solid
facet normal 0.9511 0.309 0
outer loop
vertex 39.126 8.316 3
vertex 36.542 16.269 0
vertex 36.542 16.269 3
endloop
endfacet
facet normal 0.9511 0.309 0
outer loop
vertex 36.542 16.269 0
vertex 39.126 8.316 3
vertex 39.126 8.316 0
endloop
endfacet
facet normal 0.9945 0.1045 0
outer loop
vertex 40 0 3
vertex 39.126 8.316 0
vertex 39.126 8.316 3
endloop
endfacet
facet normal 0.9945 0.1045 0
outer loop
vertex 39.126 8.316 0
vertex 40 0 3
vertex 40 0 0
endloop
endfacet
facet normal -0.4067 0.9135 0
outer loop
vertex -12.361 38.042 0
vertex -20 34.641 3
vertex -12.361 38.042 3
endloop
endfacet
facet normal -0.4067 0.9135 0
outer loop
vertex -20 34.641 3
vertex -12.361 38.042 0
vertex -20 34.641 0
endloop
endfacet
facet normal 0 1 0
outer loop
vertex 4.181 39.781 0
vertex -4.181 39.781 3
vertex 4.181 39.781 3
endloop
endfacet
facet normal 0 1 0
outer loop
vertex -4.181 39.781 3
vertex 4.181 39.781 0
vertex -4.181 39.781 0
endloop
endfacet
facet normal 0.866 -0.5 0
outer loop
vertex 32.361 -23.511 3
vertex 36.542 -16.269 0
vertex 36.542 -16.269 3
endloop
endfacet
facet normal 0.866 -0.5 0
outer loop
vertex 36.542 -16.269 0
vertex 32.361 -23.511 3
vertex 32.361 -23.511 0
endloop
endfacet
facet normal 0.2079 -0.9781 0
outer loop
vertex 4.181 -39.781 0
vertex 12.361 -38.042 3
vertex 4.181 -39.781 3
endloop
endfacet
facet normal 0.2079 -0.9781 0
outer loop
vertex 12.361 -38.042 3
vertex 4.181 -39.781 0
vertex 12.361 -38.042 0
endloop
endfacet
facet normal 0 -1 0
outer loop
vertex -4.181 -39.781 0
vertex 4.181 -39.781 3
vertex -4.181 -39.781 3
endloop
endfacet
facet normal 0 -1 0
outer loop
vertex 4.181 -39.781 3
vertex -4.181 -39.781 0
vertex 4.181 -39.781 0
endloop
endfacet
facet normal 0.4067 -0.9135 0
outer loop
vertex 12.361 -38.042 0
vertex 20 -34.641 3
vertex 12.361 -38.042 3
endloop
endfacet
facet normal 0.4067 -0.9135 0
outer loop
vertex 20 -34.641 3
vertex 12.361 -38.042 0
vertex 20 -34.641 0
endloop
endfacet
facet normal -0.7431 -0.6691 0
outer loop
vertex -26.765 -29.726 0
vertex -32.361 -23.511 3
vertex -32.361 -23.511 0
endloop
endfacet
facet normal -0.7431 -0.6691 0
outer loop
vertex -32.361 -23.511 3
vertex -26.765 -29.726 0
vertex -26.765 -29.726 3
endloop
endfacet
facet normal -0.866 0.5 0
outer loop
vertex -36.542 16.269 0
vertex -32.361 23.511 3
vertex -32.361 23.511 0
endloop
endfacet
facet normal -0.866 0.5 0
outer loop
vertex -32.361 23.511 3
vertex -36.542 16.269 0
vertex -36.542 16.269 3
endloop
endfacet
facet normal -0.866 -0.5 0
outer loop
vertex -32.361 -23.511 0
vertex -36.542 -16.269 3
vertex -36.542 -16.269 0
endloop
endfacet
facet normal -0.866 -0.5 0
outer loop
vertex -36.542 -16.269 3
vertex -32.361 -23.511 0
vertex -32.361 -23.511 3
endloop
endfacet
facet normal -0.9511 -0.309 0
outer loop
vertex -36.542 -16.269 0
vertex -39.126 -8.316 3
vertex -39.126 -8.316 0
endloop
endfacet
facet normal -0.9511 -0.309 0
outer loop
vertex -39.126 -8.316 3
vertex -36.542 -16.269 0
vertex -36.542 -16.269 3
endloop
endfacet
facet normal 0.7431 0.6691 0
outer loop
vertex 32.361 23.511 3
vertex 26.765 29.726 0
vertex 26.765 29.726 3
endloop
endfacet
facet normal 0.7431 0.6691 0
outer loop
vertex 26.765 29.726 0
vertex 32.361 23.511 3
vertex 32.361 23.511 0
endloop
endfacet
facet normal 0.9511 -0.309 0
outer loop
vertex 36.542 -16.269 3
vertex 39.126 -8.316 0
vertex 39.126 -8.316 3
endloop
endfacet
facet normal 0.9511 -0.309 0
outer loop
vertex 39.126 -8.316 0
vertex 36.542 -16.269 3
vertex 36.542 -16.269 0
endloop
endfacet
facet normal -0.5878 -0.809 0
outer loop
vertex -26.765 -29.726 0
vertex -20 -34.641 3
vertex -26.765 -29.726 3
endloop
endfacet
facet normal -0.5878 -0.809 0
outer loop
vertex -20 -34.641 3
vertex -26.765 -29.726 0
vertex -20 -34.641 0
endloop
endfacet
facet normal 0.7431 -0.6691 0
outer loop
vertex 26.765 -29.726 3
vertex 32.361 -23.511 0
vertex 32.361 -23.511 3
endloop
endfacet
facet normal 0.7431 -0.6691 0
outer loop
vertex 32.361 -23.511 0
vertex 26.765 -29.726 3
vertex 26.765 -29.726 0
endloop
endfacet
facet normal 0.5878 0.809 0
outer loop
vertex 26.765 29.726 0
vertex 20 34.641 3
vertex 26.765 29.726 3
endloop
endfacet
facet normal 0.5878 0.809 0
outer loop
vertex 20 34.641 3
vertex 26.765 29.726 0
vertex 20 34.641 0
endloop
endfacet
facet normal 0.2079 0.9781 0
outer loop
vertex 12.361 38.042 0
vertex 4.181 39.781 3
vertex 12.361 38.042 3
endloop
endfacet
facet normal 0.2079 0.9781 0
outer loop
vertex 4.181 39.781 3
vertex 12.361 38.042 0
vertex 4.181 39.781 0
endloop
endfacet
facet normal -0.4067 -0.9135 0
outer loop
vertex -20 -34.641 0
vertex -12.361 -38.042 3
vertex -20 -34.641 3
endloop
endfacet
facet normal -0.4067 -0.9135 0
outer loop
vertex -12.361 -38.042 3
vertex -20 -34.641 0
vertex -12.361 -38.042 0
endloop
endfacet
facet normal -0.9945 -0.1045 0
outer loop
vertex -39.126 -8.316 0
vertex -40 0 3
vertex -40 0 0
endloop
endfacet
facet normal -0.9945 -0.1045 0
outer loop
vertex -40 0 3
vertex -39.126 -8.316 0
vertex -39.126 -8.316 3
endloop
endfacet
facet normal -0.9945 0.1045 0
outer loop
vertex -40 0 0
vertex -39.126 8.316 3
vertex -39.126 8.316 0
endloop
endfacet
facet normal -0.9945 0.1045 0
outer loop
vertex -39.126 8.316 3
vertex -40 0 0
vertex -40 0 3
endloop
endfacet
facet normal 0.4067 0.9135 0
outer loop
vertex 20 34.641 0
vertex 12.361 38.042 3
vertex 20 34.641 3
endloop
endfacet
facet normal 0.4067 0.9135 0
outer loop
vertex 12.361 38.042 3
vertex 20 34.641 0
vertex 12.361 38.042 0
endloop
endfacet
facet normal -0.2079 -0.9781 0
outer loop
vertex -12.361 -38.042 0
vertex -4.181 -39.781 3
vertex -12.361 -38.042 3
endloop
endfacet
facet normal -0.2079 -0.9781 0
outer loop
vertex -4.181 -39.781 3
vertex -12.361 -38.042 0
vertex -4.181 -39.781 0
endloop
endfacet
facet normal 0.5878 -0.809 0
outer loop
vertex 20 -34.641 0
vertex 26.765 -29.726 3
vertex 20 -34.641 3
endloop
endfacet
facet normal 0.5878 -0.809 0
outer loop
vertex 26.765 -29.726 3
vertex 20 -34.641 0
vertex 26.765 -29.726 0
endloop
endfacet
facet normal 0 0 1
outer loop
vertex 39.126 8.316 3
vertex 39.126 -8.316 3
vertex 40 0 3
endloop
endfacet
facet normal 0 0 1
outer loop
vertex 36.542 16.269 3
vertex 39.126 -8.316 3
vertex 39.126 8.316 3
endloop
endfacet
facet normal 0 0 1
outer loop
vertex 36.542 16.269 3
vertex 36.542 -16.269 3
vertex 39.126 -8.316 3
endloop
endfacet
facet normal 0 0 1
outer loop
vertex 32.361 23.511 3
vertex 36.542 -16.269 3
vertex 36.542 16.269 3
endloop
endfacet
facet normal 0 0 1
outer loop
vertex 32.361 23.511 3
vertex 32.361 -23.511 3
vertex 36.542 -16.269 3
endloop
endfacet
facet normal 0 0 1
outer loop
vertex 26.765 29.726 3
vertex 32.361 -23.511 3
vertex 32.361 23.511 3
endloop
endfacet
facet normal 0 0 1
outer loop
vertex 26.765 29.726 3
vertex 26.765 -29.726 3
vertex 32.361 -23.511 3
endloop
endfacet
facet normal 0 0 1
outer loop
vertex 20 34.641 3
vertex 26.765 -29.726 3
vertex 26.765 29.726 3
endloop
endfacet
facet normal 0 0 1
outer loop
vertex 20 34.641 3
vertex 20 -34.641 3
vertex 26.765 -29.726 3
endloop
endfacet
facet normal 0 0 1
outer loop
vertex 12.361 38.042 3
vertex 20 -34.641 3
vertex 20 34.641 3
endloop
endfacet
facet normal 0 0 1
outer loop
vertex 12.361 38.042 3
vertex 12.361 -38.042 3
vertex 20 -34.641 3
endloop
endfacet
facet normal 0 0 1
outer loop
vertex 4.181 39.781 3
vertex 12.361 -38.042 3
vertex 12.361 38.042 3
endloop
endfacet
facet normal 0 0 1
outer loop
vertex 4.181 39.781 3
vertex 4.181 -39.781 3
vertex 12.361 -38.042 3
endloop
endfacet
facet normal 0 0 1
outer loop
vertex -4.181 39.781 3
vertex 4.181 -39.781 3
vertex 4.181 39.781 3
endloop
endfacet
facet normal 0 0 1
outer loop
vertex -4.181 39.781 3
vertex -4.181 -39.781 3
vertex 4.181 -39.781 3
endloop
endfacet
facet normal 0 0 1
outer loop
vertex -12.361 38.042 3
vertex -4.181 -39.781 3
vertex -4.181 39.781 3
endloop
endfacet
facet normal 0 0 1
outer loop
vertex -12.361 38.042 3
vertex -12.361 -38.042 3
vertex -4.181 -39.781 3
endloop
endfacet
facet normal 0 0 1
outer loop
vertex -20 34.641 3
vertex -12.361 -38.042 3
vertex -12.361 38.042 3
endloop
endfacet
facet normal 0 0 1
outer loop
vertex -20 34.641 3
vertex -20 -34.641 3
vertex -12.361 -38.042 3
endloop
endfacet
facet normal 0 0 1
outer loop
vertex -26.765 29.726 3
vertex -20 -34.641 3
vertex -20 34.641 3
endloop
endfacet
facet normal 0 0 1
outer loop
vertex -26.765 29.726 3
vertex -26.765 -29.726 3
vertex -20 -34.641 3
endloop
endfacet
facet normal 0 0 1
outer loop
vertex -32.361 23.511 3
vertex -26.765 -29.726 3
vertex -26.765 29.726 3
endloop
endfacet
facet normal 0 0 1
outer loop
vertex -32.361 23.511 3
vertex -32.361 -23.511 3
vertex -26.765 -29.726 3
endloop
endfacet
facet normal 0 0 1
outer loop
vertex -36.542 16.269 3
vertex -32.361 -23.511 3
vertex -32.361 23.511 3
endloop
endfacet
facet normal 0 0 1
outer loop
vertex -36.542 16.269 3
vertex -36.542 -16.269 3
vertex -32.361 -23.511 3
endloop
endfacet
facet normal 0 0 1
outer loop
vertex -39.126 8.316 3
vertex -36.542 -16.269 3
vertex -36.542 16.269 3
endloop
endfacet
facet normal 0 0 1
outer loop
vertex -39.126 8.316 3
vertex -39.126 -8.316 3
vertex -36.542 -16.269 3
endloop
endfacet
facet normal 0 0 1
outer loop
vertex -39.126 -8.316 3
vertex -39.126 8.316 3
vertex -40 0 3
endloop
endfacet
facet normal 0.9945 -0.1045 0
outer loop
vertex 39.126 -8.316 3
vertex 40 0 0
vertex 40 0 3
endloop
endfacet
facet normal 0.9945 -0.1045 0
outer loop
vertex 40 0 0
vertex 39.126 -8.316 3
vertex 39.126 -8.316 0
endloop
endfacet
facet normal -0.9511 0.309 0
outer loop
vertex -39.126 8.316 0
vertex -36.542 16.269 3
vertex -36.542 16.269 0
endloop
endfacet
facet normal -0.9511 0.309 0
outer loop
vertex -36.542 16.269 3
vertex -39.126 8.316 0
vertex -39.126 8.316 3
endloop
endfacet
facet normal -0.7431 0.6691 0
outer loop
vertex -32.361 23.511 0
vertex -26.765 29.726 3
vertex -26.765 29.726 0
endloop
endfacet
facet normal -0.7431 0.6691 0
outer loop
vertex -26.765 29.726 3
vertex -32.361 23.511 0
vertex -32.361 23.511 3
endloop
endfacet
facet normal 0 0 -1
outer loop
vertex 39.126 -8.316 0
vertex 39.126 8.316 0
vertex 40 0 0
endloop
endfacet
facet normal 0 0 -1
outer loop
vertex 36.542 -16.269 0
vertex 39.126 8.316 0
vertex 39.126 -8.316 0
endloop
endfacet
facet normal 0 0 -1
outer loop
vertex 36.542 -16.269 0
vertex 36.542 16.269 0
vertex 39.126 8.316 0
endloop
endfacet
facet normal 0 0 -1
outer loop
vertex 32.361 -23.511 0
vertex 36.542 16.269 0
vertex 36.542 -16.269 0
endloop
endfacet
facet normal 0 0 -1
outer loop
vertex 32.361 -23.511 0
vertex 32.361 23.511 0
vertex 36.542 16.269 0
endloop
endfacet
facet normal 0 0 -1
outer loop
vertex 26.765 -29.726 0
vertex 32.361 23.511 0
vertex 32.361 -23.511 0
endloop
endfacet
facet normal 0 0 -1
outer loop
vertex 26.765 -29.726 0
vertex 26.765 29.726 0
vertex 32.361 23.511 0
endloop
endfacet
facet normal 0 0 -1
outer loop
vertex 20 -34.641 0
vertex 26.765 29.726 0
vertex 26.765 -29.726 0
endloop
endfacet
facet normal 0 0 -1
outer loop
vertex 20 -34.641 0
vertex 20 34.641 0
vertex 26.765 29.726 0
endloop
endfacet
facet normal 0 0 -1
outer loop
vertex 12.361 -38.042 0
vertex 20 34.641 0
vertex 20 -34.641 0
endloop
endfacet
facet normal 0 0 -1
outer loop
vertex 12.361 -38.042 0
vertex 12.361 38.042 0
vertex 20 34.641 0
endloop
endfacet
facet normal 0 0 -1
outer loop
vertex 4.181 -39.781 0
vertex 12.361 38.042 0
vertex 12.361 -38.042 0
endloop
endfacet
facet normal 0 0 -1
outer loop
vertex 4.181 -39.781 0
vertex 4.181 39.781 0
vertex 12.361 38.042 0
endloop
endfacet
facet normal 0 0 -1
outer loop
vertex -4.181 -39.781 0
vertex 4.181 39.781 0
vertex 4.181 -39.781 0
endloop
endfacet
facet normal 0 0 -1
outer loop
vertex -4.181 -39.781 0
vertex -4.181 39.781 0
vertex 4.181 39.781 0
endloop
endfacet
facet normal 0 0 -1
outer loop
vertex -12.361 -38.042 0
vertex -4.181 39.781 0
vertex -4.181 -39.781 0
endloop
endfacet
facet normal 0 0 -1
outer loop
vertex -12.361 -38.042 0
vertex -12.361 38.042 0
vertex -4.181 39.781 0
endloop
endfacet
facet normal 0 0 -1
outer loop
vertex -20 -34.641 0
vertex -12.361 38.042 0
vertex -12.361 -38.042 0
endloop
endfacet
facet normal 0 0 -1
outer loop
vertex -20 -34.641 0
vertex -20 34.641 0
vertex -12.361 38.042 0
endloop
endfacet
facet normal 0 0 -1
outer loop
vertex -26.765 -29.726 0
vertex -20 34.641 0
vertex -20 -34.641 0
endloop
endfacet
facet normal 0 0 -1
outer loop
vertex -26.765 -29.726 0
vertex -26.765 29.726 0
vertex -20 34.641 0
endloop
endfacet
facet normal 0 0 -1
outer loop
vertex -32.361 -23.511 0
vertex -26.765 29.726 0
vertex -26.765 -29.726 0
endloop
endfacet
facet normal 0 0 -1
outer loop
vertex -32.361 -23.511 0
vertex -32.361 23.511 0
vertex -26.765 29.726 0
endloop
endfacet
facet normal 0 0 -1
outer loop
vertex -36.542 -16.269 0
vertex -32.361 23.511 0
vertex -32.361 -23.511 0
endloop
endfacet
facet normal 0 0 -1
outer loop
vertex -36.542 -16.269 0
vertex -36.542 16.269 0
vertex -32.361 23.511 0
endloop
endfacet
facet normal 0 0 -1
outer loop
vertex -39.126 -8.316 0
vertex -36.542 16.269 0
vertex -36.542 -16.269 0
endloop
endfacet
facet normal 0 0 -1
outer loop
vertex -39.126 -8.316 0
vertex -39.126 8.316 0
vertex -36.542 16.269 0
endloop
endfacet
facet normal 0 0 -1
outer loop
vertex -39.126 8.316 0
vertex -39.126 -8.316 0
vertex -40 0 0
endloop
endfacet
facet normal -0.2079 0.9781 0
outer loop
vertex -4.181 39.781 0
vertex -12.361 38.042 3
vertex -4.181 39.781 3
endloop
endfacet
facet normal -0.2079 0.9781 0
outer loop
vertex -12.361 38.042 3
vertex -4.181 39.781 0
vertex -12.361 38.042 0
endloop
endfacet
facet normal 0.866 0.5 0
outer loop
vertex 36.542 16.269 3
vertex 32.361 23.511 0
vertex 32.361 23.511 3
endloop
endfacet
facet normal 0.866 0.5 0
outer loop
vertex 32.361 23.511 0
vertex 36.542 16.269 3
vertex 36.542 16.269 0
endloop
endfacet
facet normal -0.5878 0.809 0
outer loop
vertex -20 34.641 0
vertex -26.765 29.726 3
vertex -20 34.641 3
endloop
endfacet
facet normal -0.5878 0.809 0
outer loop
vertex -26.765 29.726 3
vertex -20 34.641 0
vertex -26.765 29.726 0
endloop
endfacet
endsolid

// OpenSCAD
// preview[view:south, tilt:top]

// Diameter of coaster
outer_diam = 80;

// Thickness of coaster
thickness = 3;

// Width of coaster lip
lip_width = 1;

// Moire pattern inset thickness
inset_thickness = 1;

// Number of moire curves
moire_count = 10;

// Diameter of moire curves
moire_diam = 70;

// Thickness of moire curves
moire_thickness = 3;

// Where the curve reverses direction
moire_join_angle = 40;

// Moire curve offset from center
center_diam = 10;

// Offset when drawing the reverse pattern
moire_mirror_angle = 66;

/////////////////////////////////////////////////////////////

difference()
{
  linear_extrude(height=thickness)
    circle(outer_diam/2);
  translate([0, 0, thickness - inset_thickness])
    linear_extrude(height=inset_thickness+0.1)
    {
      moire_scythe();
      rotate(moire_mirror_angle) mirror() moire_scythe();
    }
}

linear_extrude(height=thickness)
difference()
{
  circle(outer_diam/2);
  circle(outer_diam/2 - lip_width);
}

/////////////////////////////////////////////////////////////

module moire_scythe()
{
  spacing_angle = 360 / moire_count;
  join_angle = 180 + moire_join_angle;
  center_off = center_diam/2;
  inner_radius = moire_diam/4;
  outer_radius = moire_diam/3;

  circle(center_diam/2);

  for (c = [0 : moire_count-1])
  {
    rotate([0, 0, spacing_angle * c])
    union()
    {
      intersection()
      {
        translate([inner_radius-center_off, 0, 0])
          circle_trace(inner_radius);
        rotate([0, 0, join_angle])
          translate([outer_radius-center_off, 0, 0])
            circle(outer_radius);
        translate([0, -moire_diam, 0])
          square(moire_diam*2, center=true);
      }

      difference()
      {
        rotate([0, 0, join_angle])
          translate([outer_radius-center_off, 0, 0])
            difference()
            {
              circle_trace(outer_radius);
              translate([0,-moire_diam,0])
                square(moire_diam*2, center=true);
            }
        translate([inner_radius-center_off, 0, 0])
          circle(inner_radius);
      }
    }
  }
}

module circle_trace(rad)
{
  difference()
  {
    circle(rad);
    circle(rad - moire_thickness);
  }
}
